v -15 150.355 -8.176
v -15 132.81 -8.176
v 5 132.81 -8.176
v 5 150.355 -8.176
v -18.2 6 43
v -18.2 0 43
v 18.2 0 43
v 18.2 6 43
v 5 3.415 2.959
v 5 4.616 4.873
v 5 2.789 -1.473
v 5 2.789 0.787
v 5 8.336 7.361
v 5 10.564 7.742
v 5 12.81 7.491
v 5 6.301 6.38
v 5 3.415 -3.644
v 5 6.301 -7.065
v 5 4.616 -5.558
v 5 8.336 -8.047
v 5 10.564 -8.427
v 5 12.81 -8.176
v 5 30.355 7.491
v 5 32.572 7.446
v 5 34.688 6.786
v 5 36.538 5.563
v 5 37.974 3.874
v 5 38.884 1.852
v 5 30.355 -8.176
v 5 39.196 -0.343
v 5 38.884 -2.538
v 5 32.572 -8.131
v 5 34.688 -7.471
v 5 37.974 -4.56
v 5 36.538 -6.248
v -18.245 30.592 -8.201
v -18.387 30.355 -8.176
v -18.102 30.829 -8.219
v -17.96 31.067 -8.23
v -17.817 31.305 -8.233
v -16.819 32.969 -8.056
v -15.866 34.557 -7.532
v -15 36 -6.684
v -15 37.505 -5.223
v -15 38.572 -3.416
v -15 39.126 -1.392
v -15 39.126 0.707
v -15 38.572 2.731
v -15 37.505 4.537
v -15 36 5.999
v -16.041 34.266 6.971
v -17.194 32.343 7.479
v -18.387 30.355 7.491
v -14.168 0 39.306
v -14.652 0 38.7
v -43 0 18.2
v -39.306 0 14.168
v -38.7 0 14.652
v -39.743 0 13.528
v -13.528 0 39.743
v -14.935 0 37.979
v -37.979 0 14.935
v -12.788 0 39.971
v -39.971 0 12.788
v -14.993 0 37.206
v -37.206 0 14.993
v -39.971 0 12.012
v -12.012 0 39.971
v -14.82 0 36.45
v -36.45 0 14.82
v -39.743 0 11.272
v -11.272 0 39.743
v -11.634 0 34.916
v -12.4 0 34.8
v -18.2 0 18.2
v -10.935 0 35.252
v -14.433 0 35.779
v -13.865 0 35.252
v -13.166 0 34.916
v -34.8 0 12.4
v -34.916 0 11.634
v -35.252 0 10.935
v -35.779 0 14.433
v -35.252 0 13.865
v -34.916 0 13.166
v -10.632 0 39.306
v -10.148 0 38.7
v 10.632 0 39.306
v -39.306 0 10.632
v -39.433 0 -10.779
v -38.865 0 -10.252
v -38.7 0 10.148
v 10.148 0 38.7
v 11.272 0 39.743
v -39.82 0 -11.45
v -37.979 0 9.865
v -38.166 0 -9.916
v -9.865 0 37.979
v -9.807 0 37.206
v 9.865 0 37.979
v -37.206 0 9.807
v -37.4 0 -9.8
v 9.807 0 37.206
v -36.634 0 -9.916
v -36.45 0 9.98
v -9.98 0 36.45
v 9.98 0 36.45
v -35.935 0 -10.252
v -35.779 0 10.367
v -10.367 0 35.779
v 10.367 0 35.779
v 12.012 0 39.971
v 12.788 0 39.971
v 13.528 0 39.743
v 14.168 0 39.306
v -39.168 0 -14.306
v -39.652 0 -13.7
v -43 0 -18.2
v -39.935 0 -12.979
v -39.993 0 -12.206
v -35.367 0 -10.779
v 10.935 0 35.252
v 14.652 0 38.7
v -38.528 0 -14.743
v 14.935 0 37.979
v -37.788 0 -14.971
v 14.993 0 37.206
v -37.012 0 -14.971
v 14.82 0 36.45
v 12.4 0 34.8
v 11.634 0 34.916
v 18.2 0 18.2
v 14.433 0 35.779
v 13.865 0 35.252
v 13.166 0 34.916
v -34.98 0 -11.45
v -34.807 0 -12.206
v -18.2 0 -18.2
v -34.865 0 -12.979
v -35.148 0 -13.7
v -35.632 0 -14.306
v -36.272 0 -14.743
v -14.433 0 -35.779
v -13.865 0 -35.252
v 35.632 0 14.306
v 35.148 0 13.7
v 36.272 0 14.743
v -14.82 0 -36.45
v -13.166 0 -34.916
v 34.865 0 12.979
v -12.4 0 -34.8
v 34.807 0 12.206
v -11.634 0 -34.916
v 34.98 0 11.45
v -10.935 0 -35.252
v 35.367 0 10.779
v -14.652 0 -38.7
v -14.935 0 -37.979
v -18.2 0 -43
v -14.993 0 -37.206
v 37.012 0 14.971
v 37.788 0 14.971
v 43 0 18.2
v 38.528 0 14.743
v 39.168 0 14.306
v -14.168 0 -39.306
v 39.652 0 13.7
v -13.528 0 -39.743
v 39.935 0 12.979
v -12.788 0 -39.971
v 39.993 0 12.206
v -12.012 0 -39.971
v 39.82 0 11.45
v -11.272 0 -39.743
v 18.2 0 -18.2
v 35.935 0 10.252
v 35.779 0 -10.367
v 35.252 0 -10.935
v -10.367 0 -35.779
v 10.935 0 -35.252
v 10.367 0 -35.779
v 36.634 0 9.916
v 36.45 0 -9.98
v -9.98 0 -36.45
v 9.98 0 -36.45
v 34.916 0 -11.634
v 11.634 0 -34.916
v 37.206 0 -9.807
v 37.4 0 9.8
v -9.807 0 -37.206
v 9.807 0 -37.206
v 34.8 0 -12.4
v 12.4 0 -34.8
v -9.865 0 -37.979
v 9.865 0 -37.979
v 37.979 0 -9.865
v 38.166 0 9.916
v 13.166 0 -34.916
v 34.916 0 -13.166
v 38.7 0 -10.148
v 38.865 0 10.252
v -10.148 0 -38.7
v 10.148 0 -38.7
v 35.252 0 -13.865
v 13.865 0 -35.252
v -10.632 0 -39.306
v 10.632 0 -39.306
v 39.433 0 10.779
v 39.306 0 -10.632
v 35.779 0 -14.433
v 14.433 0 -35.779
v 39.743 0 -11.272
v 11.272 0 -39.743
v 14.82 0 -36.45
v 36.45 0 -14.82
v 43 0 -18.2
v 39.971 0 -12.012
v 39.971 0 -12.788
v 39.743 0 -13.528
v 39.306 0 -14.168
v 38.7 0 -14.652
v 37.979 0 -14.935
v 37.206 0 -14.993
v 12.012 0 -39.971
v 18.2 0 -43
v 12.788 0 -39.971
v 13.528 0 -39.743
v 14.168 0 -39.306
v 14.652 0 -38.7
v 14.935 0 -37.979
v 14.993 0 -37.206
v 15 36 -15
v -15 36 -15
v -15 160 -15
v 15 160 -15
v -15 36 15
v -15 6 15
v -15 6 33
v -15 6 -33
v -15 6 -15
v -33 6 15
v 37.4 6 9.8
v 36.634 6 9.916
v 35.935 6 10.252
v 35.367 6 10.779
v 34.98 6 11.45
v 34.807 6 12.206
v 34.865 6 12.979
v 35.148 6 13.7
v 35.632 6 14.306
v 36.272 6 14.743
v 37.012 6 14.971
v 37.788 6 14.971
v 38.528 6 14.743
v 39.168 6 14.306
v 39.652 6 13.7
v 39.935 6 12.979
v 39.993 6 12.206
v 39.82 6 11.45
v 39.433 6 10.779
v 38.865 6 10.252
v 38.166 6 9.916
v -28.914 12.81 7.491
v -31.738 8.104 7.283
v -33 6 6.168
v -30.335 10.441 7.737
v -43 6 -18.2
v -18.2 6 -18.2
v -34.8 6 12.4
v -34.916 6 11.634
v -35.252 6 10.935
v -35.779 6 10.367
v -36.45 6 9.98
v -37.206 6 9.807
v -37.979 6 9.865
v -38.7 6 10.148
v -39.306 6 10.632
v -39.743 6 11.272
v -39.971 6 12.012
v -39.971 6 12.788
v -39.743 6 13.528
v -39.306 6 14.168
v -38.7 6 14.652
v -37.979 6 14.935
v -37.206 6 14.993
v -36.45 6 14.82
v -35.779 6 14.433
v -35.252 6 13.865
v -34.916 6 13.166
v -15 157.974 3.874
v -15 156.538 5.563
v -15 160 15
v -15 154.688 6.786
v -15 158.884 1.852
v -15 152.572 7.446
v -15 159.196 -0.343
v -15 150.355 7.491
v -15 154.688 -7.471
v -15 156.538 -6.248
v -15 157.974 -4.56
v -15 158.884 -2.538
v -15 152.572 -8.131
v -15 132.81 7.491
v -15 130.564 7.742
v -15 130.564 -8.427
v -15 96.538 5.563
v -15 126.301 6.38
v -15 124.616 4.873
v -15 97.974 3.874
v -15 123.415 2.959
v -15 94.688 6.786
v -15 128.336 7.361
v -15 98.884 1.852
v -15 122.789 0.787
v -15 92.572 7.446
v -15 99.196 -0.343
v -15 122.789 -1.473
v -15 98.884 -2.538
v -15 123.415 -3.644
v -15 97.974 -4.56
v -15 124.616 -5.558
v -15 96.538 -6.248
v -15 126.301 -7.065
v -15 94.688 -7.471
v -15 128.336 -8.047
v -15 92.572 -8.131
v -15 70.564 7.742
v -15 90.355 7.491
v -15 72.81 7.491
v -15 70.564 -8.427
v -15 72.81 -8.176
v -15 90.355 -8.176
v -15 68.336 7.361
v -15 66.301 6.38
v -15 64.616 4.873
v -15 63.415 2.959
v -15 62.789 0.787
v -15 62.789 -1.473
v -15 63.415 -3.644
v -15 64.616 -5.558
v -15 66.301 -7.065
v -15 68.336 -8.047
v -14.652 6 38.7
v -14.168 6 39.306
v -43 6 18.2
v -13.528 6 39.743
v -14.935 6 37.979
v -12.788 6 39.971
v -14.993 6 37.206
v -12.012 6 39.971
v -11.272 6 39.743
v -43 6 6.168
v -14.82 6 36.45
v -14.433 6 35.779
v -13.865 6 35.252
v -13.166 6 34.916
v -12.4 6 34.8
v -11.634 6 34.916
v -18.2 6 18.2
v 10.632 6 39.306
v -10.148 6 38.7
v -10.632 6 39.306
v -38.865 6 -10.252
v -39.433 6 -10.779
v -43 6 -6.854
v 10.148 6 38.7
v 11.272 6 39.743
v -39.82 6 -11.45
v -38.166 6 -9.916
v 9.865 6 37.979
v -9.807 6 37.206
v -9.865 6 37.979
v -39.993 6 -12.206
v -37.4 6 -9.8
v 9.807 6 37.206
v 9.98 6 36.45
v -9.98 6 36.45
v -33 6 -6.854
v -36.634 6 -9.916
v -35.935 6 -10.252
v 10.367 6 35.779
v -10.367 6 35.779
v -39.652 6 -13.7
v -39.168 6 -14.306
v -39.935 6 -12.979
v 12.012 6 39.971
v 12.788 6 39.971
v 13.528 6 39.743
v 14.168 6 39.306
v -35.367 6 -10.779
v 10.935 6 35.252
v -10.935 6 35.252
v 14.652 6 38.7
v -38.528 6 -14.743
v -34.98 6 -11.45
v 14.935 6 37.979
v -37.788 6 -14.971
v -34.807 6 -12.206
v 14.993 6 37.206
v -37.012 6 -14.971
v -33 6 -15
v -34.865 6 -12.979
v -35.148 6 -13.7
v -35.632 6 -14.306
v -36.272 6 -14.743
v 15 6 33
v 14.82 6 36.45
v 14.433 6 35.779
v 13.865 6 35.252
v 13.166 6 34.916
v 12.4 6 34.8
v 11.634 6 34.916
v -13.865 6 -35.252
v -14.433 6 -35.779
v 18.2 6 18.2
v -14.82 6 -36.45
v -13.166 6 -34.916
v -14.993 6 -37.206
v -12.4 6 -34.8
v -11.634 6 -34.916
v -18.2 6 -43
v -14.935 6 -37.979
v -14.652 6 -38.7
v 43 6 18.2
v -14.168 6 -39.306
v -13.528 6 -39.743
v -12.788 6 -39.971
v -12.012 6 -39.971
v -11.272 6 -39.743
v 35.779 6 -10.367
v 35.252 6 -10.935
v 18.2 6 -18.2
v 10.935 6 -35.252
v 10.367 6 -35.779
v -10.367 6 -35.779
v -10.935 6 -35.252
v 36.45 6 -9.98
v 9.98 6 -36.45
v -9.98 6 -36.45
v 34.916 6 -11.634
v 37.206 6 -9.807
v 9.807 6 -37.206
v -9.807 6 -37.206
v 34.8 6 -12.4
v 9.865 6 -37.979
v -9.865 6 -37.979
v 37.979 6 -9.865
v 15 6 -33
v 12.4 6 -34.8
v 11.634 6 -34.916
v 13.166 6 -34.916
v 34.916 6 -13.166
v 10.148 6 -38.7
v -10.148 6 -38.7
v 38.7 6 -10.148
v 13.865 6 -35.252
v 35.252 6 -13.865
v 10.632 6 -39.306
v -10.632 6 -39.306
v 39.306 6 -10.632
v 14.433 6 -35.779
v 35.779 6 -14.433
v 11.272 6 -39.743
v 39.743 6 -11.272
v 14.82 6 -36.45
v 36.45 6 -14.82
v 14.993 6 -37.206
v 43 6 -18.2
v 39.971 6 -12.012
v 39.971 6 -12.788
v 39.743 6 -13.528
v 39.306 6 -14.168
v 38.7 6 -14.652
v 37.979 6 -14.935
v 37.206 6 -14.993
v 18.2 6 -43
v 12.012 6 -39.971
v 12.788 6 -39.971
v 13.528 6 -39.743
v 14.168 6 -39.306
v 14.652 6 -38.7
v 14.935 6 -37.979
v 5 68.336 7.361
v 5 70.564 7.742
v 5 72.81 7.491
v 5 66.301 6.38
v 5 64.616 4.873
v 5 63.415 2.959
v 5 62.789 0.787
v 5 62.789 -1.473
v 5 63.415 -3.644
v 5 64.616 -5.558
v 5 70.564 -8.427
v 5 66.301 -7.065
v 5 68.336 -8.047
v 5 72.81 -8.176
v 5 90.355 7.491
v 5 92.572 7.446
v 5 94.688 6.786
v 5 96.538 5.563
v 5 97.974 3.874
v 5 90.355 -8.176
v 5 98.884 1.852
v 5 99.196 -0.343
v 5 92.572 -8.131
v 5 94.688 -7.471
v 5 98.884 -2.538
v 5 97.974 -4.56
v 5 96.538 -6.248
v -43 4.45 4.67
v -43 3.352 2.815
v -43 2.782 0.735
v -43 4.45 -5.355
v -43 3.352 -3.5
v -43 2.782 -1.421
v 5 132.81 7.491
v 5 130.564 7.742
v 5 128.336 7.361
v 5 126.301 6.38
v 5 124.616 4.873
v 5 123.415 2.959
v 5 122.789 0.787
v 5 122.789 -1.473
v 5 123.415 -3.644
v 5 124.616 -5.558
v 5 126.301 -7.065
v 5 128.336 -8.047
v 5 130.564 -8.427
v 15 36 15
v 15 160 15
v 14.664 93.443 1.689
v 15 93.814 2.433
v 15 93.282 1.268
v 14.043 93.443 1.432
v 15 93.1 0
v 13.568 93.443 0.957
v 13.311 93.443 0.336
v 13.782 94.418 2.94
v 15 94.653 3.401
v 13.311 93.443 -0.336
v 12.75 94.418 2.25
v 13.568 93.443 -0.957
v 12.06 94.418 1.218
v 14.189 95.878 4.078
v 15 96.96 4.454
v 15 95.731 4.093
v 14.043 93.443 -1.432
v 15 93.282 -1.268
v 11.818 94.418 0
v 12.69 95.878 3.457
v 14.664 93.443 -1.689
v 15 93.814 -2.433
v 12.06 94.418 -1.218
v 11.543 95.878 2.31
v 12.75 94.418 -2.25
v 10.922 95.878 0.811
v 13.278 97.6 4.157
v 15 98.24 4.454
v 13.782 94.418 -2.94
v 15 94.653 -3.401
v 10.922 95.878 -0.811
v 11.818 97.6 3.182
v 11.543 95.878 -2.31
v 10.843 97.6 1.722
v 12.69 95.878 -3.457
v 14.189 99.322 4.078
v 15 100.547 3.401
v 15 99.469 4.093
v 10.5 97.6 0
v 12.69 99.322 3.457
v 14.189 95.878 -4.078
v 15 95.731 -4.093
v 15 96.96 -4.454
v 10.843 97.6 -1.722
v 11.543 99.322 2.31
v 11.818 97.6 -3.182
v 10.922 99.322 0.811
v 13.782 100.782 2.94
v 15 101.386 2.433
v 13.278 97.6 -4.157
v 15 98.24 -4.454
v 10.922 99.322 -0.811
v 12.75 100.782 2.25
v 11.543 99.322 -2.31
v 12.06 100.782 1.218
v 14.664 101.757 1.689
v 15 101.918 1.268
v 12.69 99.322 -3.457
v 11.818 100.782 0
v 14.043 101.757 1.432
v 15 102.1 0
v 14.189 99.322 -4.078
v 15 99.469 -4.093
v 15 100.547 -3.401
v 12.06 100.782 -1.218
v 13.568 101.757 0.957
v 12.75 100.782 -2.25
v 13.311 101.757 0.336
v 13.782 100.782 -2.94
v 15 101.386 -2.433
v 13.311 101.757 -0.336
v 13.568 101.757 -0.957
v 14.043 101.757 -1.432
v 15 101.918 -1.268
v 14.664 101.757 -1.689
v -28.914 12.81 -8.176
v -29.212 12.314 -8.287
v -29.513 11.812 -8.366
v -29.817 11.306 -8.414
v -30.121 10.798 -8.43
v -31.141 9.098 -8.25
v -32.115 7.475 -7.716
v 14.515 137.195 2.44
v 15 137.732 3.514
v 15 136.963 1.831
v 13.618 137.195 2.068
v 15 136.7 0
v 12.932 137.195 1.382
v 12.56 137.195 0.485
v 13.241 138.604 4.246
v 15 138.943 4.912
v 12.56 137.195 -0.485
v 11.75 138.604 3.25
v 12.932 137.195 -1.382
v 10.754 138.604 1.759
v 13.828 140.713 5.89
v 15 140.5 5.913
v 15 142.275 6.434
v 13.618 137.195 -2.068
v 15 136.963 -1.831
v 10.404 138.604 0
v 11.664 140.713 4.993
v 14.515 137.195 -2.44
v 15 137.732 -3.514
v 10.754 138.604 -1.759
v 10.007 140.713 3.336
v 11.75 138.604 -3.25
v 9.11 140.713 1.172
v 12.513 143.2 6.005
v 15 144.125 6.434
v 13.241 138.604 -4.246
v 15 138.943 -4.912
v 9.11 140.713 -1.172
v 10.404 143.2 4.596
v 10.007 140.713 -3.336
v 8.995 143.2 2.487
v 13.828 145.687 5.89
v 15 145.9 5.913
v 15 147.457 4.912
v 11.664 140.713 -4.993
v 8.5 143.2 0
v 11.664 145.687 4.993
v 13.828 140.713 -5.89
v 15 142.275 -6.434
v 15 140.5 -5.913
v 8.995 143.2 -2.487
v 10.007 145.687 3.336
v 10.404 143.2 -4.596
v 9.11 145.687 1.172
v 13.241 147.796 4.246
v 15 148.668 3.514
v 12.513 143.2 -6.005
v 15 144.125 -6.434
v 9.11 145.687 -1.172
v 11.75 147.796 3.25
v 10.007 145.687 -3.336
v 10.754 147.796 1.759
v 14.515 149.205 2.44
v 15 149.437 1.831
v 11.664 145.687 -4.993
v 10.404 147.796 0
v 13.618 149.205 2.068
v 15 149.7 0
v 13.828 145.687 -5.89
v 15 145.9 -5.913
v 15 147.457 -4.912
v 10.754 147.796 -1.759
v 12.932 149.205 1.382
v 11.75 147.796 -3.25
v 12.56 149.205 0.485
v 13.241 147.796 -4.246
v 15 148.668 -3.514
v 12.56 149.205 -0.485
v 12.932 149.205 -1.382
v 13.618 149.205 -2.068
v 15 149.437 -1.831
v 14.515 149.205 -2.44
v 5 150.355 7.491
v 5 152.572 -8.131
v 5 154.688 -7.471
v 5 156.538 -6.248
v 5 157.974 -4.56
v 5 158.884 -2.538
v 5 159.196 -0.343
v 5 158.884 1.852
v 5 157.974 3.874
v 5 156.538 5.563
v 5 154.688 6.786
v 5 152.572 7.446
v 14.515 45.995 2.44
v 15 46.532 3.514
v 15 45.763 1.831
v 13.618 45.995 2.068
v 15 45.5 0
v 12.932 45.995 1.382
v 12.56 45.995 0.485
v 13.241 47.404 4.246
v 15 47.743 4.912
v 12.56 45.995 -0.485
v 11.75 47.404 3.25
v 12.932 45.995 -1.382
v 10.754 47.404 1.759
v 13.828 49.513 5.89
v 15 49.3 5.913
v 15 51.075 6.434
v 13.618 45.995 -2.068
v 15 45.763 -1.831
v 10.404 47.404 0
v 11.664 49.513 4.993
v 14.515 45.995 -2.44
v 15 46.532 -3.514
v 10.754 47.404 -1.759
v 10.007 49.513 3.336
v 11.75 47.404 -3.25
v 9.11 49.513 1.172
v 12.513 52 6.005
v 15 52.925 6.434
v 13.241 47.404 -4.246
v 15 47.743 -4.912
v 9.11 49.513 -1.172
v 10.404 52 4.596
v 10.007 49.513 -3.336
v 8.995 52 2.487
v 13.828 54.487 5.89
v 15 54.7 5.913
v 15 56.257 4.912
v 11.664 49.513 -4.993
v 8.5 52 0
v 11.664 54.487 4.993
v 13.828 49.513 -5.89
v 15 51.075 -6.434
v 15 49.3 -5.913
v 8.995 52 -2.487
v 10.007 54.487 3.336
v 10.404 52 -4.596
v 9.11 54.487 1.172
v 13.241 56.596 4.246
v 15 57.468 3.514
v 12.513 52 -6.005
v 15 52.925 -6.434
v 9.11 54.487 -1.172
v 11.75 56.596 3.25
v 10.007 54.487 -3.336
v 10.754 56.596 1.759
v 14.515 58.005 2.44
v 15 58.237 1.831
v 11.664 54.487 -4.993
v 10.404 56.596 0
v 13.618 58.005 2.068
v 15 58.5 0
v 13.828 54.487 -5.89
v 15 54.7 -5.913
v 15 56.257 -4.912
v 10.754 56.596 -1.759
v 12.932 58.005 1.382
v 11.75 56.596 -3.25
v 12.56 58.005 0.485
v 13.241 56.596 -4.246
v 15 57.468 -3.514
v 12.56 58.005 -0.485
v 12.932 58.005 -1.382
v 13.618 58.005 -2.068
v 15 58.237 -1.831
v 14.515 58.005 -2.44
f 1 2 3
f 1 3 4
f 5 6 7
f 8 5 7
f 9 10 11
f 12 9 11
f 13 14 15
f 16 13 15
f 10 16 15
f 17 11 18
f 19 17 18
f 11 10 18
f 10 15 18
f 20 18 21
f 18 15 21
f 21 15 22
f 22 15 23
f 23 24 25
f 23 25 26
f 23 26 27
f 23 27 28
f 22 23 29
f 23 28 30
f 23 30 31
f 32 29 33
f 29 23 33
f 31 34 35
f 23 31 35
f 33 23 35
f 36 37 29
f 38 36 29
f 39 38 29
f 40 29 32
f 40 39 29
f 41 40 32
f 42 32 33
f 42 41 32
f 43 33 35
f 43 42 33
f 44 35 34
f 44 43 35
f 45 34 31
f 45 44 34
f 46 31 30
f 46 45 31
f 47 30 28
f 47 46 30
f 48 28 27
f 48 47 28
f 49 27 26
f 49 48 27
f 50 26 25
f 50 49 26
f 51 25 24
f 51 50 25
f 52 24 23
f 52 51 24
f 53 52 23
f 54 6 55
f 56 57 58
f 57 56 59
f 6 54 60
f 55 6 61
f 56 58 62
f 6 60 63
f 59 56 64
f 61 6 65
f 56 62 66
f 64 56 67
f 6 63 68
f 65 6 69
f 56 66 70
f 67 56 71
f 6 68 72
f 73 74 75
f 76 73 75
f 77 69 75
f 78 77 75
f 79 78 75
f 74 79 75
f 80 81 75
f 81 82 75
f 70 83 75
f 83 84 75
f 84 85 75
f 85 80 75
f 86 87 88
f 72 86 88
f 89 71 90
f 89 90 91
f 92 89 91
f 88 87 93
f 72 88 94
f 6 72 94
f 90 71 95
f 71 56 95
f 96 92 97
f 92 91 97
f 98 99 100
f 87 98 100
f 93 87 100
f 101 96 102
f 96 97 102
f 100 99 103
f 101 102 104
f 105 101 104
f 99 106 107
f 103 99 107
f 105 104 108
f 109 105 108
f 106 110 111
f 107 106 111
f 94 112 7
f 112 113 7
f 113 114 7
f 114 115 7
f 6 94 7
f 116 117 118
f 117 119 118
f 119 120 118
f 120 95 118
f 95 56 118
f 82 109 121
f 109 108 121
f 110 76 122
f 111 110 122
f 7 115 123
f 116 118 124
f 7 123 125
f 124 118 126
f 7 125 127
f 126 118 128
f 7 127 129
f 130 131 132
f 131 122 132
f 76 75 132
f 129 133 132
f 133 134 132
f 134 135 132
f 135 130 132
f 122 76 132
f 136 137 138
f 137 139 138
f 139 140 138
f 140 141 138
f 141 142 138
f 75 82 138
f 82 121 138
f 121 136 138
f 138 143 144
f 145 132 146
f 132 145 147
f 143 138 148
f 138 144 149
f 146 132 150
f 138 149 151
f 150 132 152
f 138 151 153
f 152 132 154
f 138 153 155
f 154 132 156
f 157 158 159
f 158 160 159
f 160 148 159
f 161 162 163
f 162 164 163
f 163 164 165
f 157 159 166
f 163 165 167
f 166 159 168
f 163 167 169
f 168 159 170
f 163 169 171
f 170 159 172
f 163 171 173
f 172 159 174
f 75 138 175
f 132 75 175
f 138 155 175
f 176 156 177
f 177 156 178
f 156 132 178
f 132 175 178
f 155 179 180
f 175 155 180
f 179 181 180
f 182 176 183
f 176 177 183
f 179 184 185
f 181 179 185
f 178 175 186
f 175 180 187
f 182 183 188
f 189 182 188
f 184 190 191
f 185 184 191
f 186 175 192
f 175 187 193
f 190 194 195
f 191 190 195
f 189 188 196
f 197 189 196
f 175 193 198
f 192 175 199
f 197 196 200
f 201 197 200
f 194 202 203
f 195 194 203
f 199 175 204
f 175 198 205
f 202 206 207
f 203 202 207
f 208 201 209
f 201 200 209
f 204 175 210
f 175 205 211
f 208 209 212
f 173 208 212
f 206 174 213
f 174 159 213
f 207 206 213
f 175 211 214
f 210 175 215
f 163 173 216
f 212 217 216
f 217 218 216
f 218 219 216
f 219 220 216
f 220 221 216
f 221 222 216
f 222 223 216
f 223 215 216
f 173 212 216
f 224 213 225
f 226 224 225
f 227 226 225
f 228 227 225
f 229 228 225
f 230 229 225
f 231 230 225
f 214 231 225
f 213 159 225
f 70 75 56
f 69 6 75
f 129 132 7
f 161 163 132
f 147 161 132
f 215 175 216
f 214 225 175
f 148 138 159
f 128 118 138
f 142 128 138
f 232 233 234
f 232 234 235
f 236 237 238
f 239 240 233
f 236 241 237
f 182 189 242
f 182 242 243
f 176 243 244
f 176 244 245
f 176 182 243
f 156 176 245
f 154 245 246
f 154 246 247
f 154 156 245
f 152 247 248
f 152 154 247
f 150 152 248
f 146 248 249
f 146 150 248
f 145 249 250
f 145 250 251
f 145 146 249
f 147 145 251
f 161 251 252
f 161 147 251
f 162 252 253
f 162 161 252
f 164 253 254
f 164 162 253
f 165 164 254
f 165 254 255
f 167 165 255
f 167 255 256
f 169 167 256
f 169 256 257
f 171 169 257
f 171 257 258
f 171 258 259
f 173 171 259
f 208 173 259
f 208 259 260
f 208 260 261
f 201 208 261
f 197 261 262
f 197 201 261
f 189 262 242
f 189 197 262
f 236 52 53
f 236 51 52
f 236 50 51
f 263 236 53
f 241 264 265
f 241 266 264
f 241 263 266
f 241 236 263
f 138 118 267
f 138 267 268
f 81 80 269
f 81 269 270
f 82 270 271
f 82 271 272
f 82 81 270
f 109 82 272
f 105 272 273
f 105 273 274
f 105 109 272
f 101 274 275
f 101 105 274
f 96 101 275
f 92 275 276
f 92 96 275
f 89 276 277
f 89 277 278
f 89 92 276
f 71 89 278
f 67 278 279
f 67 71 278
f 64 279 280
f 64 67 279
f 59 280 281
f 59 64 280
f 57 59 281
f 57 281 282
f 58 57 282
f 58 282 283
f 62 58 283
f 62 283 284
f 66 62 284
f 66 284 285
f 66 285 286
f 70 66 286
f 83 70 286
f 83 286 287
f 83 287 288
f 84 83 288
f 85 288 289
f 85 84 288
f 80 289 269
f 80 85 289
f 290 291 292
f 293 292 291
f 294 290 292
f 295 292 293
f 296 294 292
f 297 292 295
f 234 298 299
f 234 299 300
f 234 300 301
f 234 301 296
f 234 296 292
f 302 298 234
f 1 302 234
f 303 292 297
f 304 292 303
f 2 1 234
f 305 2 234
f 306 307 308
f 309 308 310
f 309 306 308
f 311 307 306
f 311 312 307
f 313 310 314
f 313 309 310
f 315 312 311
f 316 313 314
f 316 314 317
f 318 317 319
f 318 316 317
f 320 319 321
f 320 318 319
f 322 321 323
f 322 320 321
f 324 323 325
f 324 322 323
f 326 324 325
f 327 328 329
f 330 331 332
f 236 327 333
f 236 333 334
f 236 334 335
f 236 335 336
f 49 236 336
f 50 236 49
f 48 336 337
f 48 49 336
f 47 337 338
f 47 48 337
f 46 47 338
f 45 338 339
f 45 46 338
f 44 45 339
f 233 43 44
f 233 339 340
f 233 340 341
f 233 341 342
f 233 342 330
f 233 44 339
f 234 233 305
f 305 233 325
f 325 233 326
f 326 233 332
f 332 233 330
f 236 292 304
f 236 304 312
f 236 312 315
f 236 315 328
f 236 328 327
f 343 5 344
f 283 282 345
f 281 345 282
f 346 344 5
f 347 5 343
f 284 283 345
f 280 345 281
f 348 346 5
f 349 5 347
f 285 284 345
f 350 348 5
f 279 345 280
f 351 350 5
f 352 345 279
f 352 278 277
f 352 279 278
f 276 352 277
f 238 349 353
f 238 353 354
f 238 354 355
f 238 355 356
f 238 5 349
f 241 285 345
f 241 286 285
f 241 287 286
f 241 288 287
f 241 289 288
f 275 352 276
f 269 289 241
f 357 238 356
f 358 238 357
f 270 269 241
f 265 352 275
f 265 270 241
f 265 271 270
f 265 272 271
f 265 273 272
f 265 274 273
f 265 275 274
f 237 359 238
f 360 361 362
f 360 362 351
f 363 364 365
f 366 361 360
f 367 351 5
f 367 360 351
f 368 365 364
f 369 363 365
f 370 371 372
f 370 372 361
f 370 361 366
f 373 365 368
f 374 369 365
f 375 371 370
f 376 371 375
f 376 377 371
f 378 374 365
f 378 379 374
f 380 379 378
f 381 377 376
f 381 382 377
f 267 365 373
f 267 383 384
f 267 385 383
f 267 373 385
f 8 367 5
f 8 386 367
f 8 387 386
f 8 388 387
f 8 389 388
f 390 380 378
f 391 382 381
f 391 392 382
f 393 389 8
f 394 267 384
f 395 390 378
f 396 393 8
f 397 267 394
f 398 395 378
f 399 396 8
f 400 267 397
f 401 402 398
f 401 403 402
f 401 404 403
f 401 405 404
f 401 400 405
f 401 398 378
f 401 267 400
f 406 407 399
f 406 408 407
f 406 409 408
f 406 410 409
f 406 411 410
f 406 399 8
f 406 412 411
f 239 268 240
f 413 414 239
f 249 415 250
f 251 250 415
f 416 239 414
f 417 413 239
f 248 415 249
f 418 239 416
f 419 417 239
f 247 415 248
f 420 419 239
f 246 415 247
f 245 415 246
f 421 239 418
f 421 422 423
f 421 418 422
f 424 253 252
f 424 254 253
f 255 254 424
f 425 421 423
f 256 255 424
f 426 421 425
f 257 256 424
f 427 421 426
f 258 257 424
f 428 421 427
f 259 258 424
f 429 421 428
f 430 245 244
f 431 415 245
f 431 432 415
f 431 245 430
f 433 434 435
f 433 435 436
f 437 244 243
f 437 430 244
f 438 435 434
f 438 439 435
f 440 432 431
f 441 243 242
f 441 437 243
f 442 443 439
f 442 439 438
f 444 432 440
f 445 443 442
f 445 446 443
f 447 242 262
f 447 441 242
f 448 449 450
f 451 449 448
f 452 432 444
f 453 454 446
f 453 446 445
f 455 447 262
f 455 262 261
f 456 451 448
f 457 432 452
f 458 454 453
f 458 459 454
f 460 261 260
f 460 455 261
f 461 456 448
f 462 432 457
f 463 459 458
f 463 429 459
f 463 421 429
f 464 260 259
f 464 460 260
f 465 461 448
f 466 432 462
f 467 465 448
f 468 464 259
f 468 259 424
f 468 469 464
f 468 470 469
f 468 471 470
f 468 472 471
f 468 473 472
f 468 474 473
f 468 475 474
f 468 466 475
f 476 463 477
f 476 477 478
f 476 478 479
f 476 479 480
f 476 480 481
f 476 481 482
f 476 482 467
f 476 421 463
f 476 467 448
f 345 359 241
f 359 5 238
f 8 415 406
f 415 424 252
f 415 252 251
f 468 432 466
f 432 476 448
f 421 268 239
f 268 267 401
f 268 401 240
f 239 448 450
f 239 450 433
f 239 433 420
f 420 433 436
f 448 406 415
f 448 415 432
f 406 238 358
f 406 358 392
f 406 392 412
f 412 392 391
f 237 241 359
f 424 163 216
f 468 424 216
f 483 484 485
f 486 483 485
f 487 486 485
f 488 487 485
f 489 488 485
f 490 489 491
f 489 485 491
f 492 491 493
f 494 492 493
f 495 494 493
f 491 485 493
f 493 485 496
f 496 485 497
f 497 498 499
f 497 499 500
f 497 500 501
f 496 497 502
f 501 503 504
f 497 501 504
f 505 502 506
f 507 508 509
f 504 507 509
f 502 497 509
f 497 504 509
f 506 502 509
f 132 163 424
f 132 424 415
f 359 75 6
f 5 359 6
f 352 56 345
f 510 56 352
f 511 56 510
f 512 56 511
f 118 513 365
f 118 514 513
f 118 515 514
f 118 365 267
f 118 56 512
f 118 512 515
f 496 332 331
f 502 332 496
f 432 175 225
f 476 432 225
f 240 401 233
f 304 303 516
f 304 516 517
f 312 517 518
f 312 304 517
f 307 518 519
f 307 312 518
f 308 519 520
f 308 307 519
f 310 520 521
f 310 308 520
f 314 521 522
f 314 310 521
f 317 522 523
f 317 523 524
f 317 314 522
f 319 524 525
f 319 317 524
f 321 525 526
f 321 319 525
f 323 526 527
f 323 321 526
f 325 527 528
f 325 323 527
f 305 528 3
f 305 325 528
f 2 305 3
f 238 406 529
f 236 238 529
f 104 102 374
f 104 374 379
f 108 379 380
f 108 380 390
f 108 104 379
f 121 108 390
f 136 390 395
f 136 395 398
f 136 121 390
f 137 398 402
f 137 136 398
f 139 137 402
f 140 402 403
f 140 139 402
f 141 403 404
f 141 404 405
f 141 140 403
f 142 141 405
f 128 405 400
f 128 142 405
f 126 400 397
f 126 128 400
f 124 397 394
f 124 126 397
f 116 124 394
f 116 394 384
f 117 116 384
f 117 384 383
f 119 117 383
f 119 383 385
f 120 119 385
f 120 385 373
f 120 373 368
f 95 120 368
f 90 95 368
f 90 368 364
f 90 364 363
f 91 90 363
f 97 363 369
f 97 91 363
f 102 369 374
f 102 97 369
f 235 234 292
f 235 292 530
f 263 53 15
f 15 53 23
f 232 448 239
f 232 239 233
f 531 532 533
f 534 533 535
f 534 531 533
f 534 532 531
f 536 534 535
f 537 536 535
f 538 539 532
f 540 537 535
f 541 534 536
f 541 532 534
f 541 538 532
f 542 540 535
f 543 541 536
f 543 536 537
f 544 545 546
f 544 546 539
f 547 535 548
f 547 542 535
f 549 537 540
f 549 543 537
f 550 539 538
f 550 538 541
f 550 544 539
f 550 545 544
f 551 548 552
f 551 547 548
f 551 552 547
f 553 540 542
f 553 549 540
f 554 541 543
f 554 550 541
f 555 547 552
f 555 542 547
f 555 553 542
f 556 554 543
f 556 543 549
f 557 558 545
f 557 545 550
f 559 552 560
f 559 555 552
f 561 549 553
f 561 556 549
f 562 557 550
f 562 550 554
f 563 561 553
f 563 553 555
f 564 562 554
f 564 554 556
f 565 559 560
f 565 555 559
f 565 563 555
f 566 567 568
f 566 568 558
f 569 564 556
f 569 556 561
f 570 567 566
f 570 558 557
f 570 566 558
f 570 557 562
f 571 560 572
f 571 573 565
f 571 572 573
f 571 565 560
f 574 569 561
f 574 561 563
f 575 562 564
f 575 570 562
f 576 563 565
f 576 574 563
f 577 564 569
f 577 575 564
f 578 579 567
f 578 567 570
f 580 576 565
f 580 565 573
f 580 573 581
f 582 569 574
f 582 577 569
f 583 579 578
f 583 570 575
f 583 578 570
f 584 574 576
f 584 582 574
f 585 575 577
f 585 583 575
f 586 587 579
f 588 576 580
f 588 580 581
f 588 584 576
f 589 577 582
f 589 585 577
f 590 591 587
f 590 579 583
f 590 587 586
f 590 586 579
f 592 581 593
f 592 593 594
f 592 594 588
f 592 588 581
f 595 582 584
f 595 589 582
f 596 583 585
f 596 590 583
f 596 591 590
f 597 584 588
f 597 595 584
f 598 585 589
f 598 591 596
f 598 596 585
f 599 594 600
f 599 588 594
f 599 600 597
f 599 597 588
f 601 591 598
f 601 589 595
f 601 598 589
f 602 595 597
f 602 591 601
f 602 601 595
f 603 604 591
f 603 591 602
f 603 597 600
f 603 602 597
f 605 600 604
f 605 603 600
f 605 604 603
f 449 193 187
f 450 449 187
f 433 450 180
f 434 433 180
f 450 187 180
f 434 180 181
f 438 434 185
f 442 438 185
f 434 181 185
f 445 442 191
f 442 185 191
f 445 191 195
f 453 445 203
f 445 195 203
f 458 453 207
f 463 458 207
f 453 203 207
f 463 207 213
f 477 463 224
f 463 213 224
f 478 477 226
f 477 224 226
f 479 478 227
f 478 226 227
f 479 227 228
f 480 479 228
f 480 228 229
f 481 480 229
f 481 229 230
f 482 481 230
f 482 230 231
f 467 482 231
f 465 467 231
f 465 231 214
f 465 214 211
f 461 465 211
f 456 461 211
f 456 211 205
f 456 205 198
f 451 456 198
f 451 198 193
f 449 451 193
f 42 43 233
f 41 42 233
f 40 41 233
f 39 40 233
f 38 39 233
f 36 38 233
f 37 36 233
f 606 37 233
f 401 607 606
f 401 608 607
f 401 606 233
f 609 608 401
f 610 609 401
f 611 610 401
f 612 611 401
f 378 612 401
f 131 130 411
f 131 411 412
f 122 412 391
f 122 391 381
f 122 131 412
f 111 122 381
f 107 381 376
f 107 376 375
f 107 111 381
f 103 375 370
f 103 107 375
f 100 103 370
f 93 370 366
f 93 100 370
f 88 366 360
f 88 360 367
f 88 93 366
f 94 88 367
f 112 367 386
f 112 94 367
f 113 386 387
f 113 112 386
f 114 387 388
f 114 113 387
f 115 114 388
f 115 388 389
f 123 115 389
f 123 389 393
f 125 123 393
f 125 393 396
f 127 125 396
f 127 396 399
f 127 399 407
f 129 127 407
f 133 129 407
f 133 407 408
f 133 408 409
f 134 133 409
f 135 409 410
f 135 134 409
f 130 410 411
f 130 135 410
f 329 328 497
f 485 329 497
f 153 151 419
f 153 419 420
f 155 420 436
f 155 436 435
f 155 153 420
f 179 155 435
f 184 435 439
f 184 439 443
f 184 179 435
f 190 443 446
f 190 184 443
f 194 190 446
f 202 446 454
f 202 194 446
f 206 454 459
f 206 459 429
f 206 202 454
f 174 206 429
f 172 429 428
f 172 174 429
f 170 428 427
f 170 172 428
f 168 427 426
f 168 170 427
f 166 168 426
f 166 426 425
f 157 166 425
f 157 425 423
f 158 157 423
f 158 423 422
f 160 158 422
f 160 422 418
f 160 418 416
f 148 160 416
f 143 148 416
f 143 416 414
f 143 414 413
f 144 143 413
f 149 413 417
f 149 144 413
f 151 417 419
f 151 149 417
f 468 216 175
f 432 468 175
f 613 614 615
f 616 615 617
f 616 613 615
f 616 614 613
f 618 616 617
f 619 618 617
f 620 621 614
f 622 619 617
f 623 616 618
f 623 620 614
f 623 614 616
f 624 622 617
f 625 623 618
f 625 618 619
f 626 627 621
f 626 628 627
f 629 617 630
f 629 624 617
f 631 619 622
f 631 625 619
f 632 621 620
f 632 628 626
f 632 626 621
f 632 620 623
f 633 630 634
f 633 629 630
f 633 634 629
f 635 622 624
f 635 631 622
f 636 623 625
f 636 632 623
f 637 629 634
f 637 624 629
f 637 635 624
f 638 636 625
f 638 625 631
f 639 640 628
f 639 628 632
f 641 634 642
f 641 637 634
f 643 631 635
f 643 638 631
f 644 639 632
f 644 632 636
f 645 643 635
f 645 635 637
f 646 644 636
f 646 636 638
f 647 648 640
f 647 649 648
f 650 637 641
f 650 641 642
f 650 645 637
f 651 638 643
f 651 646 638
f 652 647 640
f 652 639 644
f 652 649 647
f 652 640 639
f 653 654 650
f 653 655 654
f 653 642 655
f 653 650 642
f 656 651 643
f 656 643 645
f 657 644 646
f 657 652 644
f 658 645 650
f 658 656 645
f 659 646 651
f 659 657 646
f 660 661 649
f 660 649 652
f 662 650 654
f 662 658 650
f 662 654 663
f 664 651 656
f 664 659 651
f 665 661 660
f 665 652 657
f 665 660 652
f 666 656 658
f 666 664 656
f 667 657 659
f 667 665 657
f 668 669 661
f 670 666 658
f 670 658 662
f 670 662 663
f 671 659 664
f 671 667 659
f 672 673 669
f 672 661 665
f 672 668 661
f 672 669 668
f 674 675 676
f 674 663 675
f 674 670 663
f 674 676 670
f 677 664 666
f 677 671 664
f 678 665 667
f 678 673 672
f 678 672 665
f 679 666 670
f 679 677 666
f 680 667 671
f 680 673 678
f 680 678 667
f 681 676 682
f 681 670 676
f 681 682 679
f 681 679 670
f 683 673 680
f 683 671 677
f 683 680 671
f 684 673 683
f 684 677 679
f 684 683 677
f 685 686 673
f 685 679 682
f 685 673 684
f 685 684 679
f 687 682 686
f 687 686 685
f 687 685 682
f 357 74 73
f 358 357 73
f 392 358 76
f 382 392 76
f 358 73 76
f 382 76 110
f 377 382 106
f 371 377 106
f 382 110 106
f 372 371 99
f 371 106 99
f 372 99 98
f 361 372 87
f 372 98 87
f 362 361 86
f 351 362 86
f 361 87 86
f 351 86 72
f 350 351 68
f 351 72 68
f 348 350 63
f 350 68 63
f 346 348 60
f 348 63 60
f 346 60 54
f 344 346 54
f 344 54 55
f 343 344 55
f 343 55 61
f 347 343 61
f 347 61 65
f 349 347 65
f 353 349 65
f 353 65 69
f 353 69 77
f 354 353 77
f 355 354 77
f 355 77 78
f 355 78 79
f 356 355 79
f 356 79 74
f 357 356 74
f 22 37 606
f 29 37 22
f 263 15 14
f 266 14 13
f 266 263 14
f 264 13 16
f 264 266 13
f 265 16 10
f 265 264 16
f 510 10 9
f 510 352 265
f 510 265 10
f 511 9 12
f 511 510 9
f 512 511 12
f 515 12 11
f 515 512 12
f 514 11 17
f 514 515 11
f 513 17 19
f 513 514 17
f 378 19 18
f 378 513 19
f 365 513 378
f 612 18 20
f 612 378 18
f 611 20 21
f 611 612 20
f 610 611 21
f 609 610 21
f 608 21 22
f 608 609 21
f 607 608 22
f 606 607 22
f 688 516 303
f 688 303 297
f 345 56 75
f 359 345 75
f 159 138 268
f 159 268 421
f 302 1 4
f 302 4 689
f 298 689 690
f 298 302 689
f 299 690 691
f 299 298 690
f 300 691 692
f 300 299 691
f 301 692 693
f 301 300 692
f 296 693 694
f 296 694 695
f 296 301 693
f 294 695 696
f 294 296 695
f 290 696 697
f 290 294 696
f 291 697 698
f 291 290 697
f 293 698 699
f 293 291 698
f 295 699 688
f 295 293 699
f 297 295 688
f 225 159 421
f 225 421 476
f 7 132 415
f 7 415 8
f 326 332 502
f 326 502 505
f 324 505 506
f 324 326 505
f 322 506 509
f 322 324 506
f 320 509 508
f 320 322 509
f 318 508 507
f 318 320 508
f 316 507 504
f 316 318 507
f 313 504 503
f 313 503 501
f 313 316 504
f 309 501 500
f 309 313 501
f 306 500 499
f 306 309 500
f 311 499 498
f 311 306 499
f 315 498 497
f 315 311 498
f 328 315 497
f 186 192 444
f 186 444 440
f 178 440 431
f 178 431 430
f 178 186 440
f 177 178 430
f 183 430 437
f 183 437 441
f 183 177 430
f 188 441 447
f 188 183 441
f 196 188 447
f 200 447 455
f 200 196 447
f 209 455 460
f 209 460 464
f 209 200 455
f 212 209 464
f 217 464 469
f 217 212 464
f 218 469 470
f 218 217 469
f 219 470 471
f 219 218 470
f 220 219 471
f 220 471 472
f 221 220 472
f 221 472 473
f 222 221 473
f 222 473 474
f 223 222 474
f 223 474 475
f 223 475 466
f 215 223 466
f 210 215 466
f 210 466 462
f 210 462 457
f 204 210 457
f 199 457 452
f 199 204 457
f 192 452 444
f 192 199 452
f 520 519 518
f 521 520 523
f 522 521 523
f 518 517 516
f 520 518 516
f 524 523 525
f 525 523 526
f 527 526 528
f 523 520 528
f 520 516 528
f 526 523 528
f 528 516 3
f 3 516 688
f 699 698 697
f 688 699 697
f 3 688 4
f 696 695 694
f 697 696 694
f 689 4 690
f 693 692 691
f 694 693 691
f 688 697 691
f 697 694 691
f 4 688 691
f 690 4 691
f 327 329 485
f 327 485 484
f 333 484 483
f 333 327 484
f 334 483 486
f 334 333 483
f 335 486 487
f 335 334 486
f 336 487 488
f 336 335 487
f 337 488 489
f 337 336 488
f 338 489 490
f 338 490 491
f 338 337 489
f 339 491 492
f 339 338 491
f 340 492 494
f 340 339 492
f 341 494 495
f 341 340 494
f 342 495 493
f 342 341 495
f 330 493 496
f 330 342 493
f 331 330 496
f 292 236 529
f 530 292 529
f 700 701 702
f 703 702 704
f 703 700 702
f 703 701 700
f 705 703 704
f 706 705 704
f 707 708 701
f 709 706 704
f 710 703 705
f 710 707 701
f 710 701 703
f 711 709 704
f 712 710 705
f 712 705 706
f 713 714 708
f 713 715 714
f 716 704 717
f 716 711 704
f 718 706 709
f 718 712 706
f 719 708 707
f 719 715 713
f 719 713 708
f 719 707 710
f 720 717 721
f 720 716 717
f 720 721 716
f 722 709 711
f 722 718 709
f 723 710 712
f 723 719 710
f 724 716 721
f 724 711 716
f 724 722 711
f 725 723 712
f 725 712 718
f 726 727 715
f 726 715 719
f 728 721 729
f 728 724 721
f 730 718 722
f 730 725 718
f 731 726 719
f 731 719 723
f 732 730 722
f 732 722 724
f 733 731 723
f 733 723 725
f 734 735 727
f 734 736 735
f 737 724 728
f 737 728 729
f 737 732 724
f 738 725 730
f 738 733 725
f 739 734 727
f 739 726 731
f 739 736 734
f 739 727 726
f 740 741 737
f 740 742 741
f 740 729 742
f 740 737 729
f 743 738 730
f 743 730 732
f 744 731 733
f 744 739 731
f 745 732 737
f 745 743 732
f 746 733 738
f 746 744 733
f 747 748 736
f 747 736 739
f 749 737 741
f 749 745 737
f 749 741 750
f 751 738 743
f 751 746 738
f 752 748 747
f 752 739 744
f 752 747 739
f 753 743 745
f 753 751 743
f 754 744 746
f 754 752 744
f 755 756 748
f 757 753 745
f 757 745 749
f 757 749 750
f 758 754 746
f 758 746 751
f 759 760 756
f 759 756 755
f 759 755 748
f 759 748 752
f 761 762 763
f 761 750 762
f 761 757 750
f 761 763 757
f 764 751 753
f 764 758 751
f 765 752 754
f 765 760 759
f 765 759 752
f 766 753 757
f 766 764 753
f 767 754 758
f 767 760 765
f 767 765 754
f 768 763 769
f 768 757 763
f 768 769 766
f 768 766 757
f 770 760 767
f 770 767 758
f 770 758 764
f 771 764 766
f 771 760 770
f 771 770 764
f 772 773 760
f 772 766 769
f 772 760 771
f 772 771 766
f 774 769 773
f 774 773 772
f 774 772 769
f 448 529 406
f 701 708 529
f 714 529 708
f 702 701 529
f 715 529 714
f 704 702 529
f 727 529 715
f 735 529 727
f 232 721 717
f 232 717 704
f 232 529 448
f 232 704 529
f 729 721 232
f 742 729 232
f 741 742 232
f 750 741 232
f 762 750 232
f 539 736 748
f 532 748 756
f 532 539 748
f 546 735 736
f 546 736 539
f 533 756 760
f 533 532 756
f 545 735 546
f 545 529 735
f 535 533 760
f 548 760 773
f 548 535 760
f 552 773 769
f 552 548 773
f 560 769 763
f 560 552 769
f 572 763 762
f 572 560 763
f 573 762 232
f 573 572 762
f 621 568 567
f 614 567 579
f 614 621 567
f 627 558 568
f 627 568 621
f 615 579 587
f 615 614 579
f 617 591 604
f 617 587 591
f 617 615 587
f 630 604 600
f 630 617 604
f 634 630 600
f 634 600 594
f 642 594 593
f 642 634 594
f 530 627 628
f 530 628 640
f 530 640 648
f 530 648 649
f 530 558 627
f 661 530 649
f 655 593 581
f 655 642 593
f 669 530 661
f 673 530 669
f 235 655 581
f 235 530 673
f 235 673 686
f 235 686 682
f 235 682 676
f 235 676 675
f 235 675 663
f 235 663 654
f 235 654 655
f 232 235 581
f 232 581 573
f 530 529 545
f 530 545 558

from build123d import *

# Parameters (mm, degrees)
SKETCH_1_W                  = 86
SKETCH_1_H                  = 86
EXTRUDE_1_DEPTH             = 6
SKETCH_2_W                  = 30
SKETCH_2_H                  = 30
EXTRUDE_2_DEPTH             = 160
EXTRUDE_3_REACH             = 173.167
EXTRUDE_3_DIRECTION_2_REACH = 173.167
SKETCH_8_R                  = 2.6
CUT_EXTRUDE_2_DEPTH         = 6
CUT_EXTRUDE_3_DEPTH         = 6
PATTERN_LINEAR_1_COUNT      = 2
PATTERN_LINEAR_1_PITCH      = 91.2
MIRROR_7_COPY_1_DEPTH       = 6
MIRROR_8_COPY_1_SKETCH_R    = 2.6
MIRROR_8_COPY_1_DEPTH       = 6
PATTERN_CIRCULAR_1_COUNT    = 2
PATTERN_CIRCULAR_1_ANGLE    = 90
MIRROR_9_COPY_1_SKETCH_R    = 2.6
MIRROR_9_COPY_1_DEPTH       = 6
MIRROR_9_COPY_2_SKETCH_R    = 2.6
MIRROR_9_COPY_2_DEPTH       = 6
MIRROR_10_COPY_1_SKETCH_R   = 2.6
MIRROR_10_COPY_1_DEPTH      = 6
MIRROR_10_COPY_2_SKETCH_R   = 2.6
MIRROR_10_COPY_2_DEPTH      = 6
MIRROR_10_COPY_3_SKETCH_R   = 2.6
MIRROR_10_COPY_3_DEPTH      = 6
MIRROR_10_COPY_4_SKETCH_R   = 2.6
MIRROR_10_COPY_4_DEPTH      = 6
MIRROR_10_COPY_5_SKETCH_R   = 2.6
MIRROR_10_COPY_5_DEPTH      = 6
EXTRUDE_4_DEPTH             = 15
CUT_EXTRUDE_START           = -172.166585524
SKETCH_17_W                 = 15.666596152
SKETCH_17_H                 = 20.507289597
CUT_EXTRUDE_4_DEPTH         = 177.166585524
SKETCH_18_R                 = 7.890659629
SKETCH_18_R_2               = 8.087611604
CUT_EXTRUDE_5_DEPTH         = 177.166585524
PATTERN_START               = -8.175929672
PATTERN_LINEAR_2_OUTLINE_W  = 20
PATTERN_LINEAR_2_OUTLINE_H  = 20.507289597
PATTERN_LINEAR_2_DEPTH      = 15.666596152
PATTERN_LINEAR_3_COUNT      = 3
PATTERN_LINEAR_3_PITCH      = 60


# Read off the part's stored shape, not the designer's step: 阵列(线性)2
with BuildPart() as part:
    # 草图1 → 凸台-拉伸1 (new body)
    with BuildSketch(Plane(origin=(0, 0, 0), x_dir=(1, 0, 0), z_dir=(0, 1, 0))):
        Rectangle(SKETCH_1_W, SKETCH_1_H)
    extrude(amount=EXTRUDE_1_DEPTH)

    # 草图2 → 凸台-拉伸2 (add)
    with BuildSketch(Plane(origin=(0, 0, 0), x_dir=(1, 0, 0), z_dir=(0, 1, 0))):
        Rectangle(SKETCH_2_W, SKETCH_2_H)
    extrude(amount=EXTRUDE_2_DEPTH)

    # 凸台-拉伸3: up to this face of the body (flat: up to its plane)
    extrude_3_end = Plane(part.part.faces().sort_by_distance((0, 83, 15))[0])
    # 草图7 → 凸台-拉伸3 (add, up to the picked face)
    with BuildSketch(Plane.XY, mode=Mode.PRIVATE) as extrude_3_sk1:
        Polygon((-15, 36), (-33, 6), (-15, 6), align=None)
    extrude_3_tool1 = split(extrude(extrude_3_sk1.sketch, amount=EXTRUDE_3_REACH, mode=Mode.PRIVATE), bisect_by=extrude_3_end, keep=Keep.BOTH, mode=Mode.PRIVATE)
    add(extrude_3_tool1.solids().sort_by(Axis((-21, 16, 0), (0, 0, 1)))[0])

    # 凸台-拉伸3 direction 2: up to this face of the body (flat: up to its plane)
    extrude_3_direction_2_end = Plane(part.part.faces().sort_by_distance((0, 83, -15))[0])
    # 草图7 → 凸台-拉伸3 direction 2 (add, up to the picked face)
    with BuildSketch(Plane.XY, mode=Mode.PRIVATE) as extrude_3_direction_2_sk1:
        Polygon((-15, 36), (-33, 6), (-15, 6), align=None)
    extrude_3_direction_2_tool1 = split(extrude(extrude_3_direction_2_sk1.sketch, amount=-EXTRUDE_3_DIRECTION_2_REACH, mode=Mode.PRIVATE), bisect_by=extrude_3_direction_2_end, keep=Keep.BOTH, mode=Mode.PRIVATE)
    add(extrude_3_direction_2_tool1.solids().sort_by(Axis((-21, 16, 0), (0, 0, -1)))[0])

    # 草图8 → 切除-拉伸2 (cut)
    with BuildSketch(Plane(origin=(0, 0, 0), x_dir=(1, 0, 0), z_dir=(0, 1, 0))):
        with Locations(Location((-12.4, 37.4, 0), (0, 0, 270))):
            Circle(SKETCH_8_R)
    cut_extrude_2 = extrude(amount=CUT_EXTRUDE_2_DEPTH, mode=Mode.SUBTRACT)

    # 镜向2: 切除-拉伸2 across plane
    add(cut_extrude_2.mirror(Plane.XY), mode=Mode.SUBTRACT)

    # 草图11 → 切除-拉伸3 (cut)
    with BuildSketch(Plane(origin=(0, 0, 0), x_dir=(1, 0, 0), z_dir=(0, 1, 0))):
        Polygon((264.106039705, -18.2), (43, -18.2), (18.2, -18.2), (18.2, -43), (18.2, -264.106039705), (330.891160074, -576.797199779), (576.797199779, -330.891160074), align=None)
    cut_extrude_3 = extrude(amount=CUT_EXTRUDE_3_DEPTH, mode=Mode.SUBTRACT)

    # 草图12 → 切除-旋转2 (revolve, cut)
    with BuildSketch(Plane.XY):
        with BuildLine():
            Line((15, 58.5), (15, 45.5))
            ThreePointArc((15, 45.5), (8.5, 52), (15, 58.5))
        make_face()
    cut_revolve_2 = revolve(axis=Axis((15, 58.5, 0), (0, -1, 0)), mode=Mode.SUBTRACT)

    # 阵列(线性)1: 切除-旋转2 ×2
    with Locations(*[(0, i * PATTERN_LINEAR_1_PITCH, 0) for i in range(1, PATTERN_LINEAR_1_COUNT)]):
        add(cut_revolve_2, mode=Mode.SUBTRACT)

    # 镜向6: 切除-拉伸3 across plane
    add(cut_extrude_3.mirror(Plane.XY), mode=Mode.SUBTRACT)

    # 镜向7: 切除-拉伸3 across plane
    add(cut_extrude_3.mirror(Plane(origin=(0, 0, 0), x_dir=(0, 0, 1), z_dir=(1, 0, 0))), mode=Mode.SUBTRACT)

    # 镜向7 copy 1 sketch → 镜向7 copy 1 (cut)
    with BuildSketch(Plane(origin=(0, 0, 0), x_dir=(-1, 0, 0), z_dir=(0, 1, 0))):
        Polygon((264.106039705, -18.2), (43, -18.2), (18.2, -18.2), (18.2, -43), (18.2, -264.106039705), (330.891160074, -576.797199779), (576.797199779, -330.891160074), align=None)
    extrude(amount=MIRROR_7_COPY_1_DEPTH, mode=Mode.SUBTRACT)

    # 镜向8: 切除-拉伸2 across plane
    add(cut_extrude_2.mirror(Plane(origin=(0, 0, 0), x_dir=(0, 0, 1), z_dir=(1, 0, 0))), mode=Mode.SUBTRACT)

    # 镜向8 copy 1 sketch → 镜向8 copy 1 (cut)
    with BuildSketch(Plane(origin=(0, 0, 0), x_dir=(-1, 0, 0), z_dir=(0, 1, 0))):
        with Locations(Location((-12.4, 37.4, 0), (0, 0, 270))):
            Circle(MIRROR_8_COPY_1_SKETCH_R)
    extrude(amount=MIRROR_8_COPY_1_DEPTH, mode=Mode.SUBTRACT)

    # 阵列(圆周)1: 切除-拉伸2 ×2 about axis
    pattern_circular_1_axis = Axis((0, 0, 0), (0, 1, 0))
    for i in range(1, PATTERN_CIRCULAR_1_COUNT):
        add(cut_extrude_2.rotate(pattern_circular_1_axis, i * PATTERN_CIRCULAR_1_ANGLE / (PATTERN_CIRCULAR_1_COUNT - 1)), mode=Mode.SUBTRACT)

    # 镜向9 copy 1 sketch → 镜向9 copy 1 (cut)
    with BuildSketch(Plane.ZX):
        with Locations((-12.4, -37.4)):
            Circle(MIRROR_9_COPY_1_SKETCH_R)
    extrude(amount=MIRROR_9_COPY_1_DEPTH, mode=Mode.SUBTRACT)

    # 镜向9 copy 2 sketch → 镜向9 copy 2 (cut)
    with BuildSketch(Plane(origin=(0, 0, 0), x_dir=(1, 0, 0), z_dir=(0, 1, 0))):
        with Locations((-12.4, -37.4)):
            Circle(MIRROR_9_COPY_2_SKETCH_R)
    extrude(amount=MIRROR_9_COPY_2_DEPTH, mode=Mode.SUBTRACT)

    # 镜向10 copy 1 sketch → 镜向10 copy 1 (cut)
    with BuildSketch(Plane(origin=(0, 0, 0), x_dir=(0, 0, -1), z_dir=(0, 1, 0))):
        with Locations((-12.4, -37.4)):
            Circle(MIRROR_10_COPY_1_SKETCH_R)
    extrude(amount=MIRROR_10_COPY_1_DEPTH, mode=Mode.SUBTRACT)

    # 镜向10 copy 2 sketch → 镜向10 copy 2 (cut)
    with BuildSketch(Plane(origin=(0, 0, 0), x_dir=(-1, 0, 0), z_dir=(0, 1, 0))):
        with Locations((-12.4, -37.4)):
            Circle(MIRROR_10_COPY_2_SKETCH_R)
    extrude(amount=MIRROR_10_COPY_2_DEPTH, mode=Mode.SUBTRACT)

    # 镜向10 copy 3 sketch → 镜向10 copy 3 (cut)
    with BuildSketch(Plane.ZX):
        with Locations(Location((-12.4, 37.4, 0), (0, 0, 270))):
            Circle(MIRROR_10_COPY_3_SKETCH_R)
    extrude(amount=MIRROR_10_COPY_3_DEPTH, mode=Mode.SUBTRACT)

    # 镜向10 copy 4 sketch → 镜向10 copy 4 (cut)
    with BuildSketch(Plane(origin=(0, 0, 0), x_dir=(-1, 0, 0), z_dir=(0, 1, 0))):
        with Locations(Location((-12.4, 37.4, 0), (0, 0, 270))):
            Circle(MIRROR_10_COPY_4_SKETCH_R)
    extrude(amount=MIRROR_10_COPY_4_DEPTH, mode=Mode.SUBTRACT)

    # 镜向10 copy 5 sketch → 镜向10 copy 5 (cut)
    with BuildSketch(Plane(origin=(0, 0, 0), x_dir=(-1, 0, 0), z_dir=(0, 1, 0))):
        with Locations((-12.4, -37.4)):
            Circle(MIRROR_10_COPY_5_SKETCH_R)
    extrude(amount=MIRROR_10_COPY_5_DEPTH, mode=Mode.SUBTRACT)

    # 草图15 → 凸台-拉伸4 (add, symmetric)
    with BuildSketch(Plane(origin=(0, 0, 0), x_dir=(0, 0, -1), z_dir=(1, 0, 0))):
        Polygon((-15, 36), (-15, 6), (-33, 6), align=None)
    extrude_4 = extrude(amount=EXTRUDE_4_DEPTH, both=True)

    # 镜向11: 凸台-拉伸4 across plane
    add(extrude_4.mirror(Plane.XY))

    # 草图16 → 切除-旋转3 (revolve, cut)
    with BuildSketch(Plane.XY):
        with BuildLine():
            Line((15, 102.1), (15, 93.1))
            ThreePointArc((15, 93.1), (19.5, 97.6), (15, 102.1))
        make_face()
    revolve(axis=Axis((15, 102.1, 0), (0, -1, 0)), mode=Mode.SUBTRACT)

    # 草图17 → 切除-拉伸4 (cut)
    with BuildSketch(Plane(origin=(0, 0, 0), x_dir=(0, 0, -1), z_dir=(1, 0, 0)).offset(CUT_EXTRUDE_START)):
        with Locations((0.342631596, 141.05128602)):
            Rectangle(SKETCH_17_W, SKETCH_17_H)
    extrude(amount=CUT_EXTRUDE_4_DEPTH, mode=Mode.SUBTRACT)

    # 草图18 → 切除-拉伸5 (cut)
    with BuildSketch(Plane(origin=(0, 0, 0), x_dir=(0, 0, -1), z_dir=(1, 0, 0)).offset(CUT_EXTRUDE_START)):
        with Locations((0.342631596, 151.304930818)):
            Circle(SKETCH_18_R)
        with Locations((0.342631596, 130.797641221)):
            Circle(SKETCH_18_R_2)
    cut_extrude_5 = extrude(amount=CUT_EXTRUDE_5_DEPTH, mode=Mode.SUBTRACT)

    # 阵列(线性)2 outline → 阵列(线性)2 (cut)
    with BuildSketch(Plane.XY.offset(PATTERN_START)):
        with Locations((-5, 81.051286019)):
            Rectangle(PATTERN_LINEAR_2_OUTLINE_W, PATTERN_LINEAR_2_OUTLINE_H)
        Polygon((5, 10.797641221), (5, 31.304930818), (-17.817041509, 31.304930818), (-30.121415267, 10.797641221), align=None)
    extrude(amount=PATTERN_LINEAR_2_DEPTH, mode=Mode.SUBTRACT)

    # 阵列(线性)3: 切除-拉伸5 ×3
    with Locations(*[(0, -i * PATTERN_LINEAR_3_PITCH, 0) for i in range(1, PATTERN_LINEAR_3_COUNT)]):
        add(cut_extrude_5, mode=Mode.SUBTRACT)


solid = part.part
